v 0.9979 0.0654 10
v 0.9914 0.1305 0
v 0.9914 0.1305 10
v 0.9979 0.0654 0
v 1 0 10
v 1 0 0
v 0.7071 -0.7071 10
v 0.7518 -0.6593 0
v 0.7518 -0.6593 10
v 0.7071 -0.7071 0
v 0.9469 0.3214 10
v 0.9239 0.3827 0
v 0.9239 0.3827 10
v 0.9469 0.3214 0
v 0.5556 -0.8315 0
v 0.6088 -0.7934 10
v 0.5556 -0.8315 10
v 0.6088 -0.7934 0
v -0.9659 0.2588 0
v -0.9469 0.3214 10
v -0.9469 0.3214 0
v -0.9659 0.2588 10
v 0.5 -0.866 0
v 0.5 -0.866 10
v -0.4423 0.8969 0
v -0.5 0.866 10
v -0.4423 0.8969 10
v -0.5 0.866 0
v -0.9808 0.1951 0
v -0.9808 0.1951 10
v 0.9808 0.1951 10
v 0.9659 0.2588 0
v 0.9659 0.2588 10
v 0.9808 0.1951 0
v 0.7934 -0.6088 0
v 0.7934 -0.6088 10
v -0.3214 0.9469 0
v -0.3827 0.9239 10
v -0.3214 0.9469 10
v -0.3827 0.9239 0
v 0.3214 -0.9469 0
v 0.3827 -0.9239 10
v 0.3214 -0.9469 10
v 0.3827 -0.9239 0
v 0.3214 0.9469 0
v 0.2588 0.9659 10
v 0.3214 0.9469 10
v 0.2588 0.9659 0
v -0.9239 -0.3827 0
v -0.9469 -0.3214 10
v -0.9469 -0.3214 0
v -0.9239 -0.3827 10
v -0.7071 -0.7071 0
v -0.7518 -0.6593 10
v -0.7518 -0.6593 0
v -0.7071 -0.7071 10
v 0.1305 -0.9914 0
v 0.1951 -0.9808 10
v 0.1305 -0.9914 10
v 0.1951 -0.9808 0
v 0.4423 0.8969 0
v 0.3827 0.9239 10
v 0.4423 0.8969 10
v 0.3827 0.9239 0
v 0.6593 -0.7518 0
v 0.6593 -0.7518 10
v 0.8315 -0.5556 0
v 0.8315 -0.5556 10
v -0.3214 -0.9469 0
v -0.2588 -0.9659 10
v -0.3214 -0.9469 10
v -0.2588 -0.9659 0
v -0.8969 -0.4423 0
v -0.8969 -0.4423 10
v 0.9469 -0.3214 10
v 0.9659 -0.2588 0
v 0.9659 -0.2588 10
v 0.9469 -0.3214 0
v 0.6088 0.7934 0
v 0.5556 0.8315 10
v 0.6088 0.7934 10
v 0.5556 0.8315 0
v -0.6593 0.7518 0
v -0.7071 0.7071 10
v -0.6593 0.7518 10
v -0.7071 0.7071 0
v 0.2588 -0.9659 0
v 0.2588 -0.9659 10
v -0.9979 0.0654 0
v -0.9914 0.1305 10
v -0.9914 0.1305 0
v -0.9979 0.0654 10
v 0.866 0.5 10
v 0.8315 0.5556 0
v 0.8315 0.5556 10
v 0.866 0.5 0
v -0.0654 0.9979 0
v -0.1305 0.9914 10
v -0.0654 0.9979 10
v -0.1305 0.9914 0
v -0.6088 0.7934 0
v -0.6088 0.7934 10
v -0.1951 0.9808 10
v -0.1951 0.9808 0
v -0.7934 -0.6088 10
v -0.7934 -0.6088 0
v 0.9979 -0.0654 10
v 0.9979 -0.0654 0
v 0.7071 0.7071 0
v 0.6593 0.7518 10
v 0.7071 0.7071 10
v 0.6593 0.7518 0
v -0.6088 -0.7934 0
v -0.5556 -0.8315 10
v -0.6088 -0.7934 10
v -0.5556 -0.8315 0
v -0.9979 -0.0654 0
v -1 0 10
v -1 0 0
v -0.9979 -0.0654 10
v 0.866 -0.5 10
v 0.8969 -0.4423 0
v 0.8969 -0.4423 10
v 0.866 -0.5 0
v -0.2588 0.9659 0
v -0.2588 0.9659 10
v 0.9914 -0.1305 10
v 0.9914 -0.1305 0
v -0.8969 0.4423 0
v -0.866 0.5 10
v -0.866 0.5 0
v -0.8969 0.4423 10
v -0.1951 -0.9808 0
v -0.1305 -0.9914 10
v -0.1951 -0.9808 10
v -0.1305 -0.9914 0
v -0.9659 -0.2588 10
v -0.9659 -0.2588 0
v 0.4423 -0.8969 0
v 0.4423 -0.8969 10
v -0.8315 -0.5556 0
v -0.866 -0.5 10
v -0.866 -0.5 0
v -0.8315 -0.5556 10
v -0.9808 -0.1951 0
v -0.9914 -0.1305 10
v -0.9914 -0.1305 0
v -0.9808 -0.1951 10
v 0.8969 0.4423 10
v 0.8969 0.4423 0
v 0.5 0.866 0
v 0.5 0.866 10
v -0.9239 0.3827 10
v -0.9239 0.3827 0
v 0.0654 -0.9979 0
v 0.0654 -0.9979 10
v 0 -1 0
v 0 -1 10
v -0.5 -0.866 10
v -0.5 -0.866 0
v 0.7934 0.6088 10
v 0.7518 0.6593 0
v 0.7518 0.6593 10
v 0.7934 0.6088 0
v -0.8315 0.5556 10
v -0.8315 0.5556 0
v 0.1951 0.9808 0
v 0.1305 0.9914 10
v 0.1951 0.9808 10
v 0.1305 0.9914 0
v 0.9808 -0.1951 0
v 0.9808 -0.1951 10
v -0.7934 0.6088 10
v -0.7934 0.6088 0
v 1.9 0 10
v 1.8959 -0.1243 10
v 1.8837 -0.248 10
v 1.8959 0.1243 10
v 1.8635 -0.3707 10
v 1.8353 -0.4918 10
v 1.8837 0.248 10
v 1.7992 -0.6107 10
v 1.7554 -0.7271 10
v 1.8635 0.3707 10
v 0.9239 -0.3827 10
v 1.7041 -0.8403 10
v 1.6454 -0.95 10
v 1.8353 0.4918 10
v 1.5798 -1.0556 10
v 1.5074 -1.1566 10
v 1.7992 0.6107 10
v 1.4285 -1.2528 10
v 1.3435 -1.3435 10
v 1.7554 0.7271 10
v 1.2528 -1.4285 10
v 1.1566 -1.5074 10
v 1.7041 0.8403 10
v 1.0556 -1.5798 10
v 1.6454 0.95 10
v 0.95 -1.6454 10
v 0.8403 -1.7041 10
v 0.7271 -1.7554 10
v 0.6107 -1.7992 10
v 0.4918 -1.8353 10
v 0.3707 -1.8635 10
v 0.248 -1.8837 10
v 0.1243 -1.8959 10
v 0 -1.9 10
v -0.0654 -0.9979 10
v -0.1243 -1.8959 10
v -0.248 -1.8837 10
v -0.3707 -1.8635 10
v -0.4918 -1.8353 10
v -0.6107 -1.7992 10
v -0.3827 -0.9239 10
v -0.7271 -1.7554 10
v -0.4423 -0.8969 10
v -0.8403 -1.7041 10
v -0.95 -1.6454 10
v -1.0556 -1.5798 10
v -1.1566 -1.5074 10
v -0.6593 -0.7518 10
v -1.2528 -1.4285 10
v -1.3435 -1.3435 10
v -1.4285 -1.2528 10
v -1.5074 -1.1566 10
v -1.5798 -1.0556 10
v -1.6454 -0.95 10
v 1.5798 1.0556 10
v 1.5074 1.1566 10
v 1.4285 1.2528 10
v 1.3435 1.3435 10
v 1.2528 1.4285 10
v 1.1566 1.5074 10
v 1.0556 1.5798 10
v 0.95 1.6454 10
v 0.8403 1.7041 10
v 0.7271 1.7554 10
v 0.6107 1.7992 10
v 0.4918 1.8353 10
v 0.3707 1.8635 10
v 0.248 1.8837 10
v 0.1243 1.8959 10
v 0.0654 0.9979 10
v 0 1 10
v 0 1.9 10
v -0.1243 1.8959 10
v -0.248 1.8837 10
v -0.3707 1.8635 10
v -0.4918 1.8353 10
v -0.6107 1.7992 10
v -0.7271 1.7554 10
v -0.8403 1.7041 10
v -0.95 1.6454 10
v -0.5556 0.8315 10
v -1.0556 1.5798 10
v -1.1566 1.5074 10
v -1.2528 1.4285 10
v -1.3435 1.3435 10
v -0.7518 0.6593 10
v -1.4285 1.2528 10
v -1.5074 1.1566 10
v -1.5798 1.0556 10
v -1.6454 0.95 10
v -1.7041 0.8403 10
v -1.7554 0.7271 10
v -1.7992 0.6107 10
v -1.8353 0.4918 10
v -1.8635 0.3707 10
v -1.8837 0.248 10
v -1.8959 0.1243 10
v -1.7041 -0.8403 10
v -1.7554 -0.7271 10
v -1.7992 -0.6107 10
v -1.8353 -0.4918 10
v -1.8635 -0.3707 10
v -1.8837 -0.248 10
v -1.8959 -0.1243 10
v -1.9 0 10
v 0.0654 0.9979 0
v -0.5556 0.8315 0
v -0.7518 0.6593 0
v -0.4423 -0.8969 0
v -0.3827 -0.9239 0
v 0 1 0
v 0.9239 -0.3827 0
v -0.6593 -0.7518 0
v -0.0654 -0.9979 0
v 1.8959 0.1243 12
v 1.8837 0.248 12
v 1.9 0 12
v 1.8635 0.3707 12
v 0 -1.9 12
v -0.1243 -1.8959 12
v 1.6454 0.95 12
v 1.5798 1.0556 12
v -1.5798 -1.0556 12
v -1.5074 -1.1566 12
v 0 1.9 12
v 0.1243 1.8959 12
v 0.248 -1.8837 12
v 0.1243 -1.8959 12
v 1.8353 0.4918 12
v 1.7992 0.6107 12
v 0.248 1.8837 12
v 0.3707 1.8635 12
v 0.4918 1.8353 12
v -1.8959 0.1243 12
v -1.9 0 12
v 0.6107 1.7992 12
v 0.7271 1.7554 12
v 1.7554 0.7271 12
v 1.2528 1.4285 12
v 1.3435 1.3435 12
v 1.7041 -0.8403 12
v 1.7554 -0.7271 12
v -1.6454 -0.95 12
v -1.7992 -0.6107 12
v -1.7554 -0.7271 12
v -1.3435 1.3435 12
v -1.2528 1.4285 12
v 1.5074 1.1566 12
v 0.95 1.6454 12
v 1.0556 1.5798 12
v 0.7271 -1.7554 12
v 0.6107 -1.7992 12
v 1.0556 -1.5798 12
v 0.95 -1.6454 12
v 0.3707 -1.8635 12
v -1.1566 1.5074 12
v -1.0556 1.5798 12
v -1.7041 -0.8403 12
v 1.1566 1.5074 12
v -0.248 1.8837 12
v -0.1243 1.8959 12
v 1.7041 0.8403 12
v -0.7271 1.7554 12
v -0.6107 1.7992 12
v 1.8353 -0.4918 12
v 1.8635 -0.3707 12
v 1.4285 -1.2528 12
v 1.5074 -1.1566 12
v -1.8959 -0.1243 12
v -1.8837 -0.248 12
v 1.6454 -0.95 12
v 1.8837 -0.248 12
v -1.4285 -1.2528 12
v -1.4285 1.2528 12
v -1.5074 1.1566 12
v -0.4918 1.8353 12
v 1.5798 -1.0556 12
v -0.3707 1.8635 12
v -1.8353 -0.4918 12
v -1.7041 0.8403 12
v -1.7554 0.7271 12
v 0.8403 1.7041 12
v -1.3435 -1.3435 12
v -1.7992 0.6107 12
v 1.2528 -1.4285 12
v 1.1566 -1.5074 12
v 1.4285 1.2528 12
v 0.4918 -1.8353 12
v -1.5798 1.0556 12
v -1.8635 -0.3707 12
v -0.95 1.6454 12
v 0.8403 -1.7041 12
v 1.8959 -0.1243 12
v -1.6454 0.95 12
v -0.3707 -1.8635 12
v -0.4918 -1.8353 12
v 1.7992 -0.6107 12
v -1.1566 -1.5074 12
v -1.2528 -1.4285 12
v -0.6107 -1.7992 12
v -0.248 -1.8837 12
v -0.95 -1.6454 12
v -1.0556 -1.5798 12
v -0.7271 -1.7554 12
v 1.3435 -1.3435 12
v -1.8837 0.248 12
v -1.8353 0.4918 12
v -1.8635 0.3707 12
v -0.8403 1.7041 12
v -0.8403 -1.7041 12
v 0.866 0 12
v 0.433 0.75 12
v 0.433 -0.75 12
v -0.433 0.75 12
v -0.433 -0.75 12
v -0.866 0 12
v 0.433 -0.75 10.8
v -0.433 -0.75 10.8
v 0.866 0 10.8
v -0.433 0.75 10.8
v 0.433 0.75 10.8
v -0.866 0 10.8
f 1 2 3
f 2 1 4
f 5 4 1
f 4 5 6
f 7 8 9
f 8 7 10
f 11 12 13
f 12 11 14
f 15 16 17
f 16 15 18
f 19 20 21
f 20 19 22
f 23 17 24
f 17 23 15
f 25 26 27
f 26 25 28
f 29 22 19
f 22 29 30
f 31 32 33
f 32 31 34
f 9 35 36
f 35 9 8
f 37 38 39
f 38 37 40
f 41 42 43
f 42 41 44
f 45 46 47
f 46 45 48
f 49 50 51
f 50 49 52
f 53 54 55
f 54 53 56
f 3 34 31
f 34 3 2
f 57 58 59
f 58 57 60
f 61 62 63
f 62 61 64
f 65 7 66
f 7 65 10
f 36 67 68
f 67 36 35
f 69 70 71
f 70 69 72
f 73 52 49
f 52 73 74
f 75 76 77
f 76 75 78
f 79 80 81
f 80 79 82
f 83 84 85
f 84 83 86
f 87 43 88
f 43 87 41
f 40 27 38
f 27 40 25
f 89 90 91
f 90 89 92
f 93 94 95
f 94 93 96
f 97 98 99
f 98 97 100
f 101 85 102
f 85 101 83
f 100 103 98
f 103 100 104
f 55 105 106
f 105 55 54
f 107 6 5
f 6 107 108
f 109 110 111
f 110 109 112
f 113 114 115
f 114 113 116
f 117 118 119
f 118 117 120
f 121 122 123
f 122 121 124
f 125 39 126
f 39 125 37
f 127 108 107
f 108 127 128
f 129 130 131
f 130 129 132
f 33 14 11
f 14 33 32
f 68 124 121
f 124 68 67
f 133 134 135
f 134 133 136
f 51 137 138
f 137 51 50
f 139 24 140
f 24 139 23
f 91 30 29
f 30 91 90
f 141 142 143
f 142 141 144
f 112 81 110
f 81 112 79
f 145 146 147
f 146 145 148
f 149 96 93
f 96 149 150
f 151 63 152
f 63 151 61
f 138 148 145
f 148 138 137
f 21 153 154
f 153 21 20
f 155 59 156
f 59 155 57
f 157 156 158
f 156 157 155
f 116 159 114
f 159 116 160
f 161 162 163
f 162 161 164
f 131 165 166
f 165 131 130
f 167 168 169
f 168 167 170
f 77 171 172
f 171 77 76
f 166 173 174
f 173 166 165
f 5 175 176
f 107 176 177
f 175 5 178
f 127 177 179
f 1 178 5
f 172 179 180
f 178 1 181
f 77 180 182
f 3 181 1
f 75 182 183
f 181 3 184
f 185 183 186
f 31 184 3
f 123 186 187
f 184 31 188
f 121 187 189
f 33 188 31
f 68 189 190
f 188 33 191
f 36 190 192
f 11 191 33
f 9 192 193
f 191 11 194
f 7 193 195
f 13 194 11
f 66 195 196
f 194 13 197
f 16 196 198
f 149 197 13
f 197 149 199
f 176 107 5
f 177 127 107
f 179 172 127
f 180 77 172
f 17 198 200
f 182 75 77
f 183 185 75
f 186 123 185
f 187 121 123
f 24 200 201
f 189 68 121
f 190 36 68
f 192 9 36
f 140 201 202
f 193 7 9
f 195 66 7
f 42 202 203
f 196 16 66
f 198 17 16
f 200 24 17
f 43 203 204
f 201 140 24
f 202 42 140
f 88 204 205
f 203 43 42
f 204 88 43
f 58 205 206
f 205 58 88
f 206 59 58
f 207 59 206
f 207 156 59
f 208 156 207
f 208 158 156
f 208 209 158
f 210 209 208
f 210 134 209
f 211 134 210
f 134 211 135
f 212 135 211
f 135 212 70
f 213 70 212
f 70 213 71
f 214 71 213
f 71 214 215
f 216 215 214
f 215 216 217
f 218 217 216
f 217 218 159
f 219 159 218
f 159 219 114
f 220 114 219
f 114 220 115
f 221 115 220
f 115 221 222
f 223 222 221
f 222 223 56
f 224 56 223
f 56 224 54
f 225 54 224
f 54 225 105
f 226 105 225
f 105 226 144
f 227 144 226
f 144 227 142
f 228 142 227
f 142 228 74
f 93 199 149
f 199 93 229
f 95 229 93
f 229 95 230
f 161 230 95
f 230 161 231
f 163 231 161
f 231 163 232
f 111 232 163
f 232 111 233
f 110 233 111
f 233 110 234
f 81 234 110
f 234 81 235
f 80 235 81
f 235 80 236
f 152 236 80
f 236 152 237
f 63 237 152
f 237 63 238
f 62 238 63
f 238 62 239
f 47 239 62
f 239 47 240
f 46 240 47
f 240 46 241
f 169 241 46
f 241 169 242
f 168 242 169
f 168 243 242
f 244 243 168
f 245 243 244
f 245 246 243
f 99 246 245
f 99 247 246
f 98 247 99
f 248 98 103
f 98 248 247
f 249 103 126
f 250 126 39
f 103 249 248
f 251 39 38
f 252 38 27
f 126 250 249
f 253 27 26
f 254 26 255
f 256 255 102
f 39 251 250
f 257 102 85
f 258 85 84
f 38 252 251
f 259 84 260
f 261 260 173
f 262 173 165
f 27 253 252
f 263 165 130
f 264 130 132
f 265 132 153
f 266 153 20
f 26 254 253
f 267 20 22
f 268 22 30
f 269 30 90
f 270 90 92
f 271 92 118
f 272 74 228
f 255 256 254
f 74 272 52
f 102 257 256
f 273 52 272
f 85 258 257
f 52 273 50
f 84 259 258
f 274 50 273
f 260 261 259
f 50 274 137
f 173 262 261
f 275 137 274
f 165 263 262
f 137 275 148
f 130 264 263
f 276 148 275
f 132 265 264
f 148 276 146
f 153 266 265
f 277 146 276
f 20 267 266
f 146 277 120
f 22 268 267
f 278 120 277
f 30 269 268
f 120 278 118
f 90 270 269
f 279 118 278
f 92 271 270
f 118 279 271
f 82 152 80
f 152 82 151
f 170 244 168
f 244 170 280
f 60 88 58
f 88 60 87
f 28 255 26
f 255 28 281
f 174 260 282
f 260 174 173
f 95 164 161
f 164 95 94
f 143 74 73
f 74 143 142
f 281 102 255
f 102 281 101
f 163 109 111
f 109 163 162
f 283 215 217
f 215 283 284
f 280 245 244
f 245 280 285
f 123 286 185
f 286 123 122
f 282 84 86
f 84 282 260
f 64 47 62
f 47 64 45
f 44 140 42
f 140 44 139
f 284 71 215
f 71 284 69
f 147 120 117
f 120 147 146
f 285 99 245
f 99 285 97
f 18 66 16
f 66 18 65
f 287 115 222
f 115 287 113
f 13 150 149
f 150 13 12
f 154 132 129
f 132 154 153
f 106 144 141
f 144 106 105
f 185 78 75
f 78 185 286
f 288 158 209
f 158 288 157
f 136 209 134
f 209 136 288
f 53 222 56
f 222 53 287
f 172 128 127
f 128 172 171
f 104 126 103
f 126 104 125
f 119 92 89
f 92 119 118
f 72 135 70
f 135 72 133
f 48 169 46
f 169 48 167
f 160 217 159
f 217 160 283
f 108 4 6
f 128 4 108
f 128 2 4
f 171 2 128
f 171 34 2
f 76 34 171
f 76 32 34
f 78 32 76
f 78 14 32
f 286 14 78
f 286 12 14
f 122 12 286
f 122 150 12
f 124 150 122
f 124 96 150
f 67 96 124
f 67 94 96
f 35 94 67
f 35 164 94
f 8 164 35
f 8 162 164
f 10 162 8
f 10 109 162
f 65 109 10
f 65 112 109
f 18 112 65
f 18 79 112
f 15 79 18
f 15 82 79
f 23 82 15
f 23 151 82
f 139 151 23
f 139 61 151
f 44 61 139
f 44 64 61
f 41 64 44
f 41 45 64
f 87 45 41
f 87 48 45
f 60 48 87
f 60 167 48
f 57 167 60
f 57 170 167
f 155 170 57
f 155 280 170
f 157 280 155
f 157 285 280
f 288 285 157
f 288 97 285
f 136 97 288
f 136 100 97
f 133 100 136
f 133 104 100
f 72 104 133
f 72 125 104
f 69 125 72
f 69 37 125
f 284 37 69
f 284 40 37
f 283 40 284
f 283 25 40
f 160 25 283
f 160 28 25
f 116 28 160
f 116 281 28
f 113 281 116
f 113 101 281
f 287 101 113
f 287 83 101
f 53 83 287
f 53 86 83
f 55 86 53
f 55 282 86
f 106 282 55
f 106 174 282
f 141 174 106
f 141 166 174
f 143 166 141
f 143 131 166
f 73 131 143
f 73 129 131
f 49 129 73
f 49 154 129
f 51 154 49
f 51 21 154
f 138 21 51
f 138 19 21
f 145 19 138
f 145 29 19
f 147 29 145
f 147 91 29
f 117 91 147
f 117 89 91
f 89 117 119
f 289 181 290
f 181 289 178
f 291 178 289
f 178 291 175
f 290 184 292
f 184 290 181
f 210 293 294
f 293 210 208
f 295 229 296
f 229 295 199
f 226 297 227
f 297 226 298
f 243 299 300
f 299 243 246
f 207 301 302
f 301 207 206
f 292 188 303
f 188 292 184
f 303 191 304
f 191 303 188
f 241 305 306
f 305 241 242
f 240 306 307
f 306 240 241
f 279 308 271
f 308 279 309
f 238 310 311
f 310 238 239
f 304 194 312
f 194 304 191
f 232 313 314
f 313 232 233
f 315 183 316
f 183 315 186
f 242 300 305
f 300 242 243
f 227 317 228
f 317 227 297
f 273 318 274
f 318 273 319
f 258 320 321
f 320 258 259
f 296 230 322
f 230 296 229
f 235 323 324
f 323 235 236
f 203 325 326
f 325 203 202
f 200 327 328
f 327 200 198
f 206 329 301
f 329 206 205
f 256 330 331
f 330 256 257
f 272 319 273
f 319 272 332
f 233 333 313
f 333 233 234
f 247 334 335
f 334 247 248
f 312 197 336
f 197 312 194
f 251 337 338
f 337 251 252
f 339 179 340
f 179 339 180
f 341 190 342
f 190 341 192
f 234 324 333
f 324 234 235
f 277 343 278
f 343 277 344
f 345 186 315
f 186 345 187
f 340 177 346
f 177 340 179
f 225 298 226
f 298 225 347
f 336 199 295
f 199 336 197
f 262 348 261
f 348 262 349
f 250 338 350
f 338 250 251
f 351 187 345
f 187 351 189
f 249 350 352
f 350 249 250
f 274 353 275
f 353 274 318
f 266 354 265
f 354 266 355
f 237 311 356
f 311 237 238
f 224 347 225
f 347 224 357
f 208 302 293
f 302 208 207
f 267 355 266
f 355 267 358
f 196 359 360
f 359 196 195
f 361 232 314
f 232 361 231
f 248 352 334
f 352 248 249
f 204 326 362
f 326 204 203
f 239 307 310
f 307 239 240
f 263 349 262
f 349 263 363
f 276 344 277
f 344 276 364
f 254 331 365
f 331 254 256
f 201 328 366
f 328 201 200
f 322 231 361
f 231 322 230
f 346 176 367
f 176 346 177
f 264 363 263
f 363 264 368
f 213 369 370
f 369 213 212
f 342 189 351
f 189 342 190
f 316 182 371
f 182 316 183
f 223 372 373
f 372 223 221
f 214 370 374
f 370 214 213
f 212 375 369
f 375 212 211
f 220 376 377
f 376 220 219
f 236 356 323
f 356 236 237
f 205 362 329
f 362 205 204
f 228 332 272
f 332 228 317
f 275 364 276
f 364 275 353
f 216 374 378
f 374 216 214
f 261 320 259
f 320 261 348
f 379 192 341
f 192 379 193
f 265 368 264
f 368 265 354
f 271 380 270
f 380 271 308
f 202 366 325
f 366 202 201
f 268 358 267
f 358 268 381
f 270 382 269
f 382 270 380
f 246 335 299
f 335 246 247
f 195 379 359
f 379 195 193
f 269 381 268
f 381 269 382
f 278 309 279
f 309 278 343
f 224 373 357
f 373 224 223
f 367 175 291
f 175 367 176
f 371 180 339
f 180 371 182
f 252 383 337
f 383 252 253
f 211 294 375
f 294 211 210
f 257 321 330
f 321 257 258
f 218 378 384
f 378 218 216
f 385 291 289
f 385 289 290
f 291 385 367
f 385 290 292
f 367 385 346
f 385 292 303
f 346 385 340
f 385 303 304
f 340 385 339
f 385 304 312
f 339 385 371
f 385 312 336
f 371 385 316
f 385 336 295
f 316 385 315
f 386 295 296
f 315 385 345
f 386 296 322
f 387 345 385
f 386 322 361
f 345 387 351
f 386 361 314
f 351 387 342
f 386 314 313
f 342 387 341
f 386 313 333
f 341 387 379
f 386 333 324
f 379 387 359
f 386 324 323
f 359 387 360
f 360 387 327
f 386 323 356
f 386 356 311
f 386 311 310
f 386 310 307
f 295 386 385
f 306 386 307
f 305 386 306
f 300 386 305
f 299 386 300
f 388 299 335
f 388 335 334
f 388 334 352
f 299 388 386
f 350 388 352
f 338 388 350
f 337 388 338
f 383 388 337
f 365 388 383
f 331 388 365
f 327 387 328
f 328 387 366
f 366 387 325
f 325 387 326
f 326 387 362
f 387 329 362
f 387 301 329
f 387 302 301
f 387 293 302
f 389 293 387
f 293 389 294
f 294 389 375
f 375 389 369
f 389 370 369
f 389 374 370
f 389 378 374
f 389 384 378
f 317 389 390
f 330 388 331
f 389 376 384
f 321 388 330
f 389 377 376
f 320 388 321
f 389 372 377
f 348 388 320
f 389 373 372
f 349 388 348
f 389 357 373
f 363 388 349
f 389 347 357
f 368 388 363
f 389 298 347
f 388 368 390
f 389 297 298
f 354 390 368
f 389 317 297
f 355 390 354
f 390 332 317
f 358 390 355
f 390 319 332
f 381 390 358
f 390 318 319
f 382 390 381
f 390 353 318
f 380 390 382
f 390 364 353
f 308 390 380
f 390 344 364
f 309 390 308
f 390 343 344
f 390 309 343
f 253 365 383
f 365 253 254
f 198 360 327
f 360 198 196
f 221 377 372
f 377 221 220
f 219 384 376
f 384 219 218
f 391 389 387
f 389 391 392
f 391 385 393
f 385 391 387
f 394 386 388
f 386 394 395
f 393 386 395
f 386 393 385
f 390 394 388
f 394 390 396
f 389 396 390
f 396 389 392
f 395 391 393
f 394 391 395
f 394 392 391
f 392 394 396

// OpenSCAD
$fn = 96;

// Dimensions (mm)
shaft_d = 2.0;
length  = 10.0;

head_d  = 3.8;
head_h  = 2.0;

// Socket (hex) approximation for a 2mm screw (M2 typical)
socket_af = 1.5;          // across flats
socket_depth = 1.2;       // depth into head
socket_corner_r = socket_af / sqrt(3); // circumradius for hex

module hex_prism(r, h) {
    cylinder(r = r, h = h, $fn = 6);
}

module socket_head_cap_screw() {
    difference() {
        union() {
            // Shaft
            cylinder(d = shaft_d, h = length);

            // Head
            translate([0,0,length])
                cylinder(d = head_d, h = head_h);
        }

        // Hex socket cut
        translate([0,0,length + head_h - socket_depth])
            hex_prism(socket_corner_r, socket_depth + 0.05);
    }
}

socket_head_cap_screw();
